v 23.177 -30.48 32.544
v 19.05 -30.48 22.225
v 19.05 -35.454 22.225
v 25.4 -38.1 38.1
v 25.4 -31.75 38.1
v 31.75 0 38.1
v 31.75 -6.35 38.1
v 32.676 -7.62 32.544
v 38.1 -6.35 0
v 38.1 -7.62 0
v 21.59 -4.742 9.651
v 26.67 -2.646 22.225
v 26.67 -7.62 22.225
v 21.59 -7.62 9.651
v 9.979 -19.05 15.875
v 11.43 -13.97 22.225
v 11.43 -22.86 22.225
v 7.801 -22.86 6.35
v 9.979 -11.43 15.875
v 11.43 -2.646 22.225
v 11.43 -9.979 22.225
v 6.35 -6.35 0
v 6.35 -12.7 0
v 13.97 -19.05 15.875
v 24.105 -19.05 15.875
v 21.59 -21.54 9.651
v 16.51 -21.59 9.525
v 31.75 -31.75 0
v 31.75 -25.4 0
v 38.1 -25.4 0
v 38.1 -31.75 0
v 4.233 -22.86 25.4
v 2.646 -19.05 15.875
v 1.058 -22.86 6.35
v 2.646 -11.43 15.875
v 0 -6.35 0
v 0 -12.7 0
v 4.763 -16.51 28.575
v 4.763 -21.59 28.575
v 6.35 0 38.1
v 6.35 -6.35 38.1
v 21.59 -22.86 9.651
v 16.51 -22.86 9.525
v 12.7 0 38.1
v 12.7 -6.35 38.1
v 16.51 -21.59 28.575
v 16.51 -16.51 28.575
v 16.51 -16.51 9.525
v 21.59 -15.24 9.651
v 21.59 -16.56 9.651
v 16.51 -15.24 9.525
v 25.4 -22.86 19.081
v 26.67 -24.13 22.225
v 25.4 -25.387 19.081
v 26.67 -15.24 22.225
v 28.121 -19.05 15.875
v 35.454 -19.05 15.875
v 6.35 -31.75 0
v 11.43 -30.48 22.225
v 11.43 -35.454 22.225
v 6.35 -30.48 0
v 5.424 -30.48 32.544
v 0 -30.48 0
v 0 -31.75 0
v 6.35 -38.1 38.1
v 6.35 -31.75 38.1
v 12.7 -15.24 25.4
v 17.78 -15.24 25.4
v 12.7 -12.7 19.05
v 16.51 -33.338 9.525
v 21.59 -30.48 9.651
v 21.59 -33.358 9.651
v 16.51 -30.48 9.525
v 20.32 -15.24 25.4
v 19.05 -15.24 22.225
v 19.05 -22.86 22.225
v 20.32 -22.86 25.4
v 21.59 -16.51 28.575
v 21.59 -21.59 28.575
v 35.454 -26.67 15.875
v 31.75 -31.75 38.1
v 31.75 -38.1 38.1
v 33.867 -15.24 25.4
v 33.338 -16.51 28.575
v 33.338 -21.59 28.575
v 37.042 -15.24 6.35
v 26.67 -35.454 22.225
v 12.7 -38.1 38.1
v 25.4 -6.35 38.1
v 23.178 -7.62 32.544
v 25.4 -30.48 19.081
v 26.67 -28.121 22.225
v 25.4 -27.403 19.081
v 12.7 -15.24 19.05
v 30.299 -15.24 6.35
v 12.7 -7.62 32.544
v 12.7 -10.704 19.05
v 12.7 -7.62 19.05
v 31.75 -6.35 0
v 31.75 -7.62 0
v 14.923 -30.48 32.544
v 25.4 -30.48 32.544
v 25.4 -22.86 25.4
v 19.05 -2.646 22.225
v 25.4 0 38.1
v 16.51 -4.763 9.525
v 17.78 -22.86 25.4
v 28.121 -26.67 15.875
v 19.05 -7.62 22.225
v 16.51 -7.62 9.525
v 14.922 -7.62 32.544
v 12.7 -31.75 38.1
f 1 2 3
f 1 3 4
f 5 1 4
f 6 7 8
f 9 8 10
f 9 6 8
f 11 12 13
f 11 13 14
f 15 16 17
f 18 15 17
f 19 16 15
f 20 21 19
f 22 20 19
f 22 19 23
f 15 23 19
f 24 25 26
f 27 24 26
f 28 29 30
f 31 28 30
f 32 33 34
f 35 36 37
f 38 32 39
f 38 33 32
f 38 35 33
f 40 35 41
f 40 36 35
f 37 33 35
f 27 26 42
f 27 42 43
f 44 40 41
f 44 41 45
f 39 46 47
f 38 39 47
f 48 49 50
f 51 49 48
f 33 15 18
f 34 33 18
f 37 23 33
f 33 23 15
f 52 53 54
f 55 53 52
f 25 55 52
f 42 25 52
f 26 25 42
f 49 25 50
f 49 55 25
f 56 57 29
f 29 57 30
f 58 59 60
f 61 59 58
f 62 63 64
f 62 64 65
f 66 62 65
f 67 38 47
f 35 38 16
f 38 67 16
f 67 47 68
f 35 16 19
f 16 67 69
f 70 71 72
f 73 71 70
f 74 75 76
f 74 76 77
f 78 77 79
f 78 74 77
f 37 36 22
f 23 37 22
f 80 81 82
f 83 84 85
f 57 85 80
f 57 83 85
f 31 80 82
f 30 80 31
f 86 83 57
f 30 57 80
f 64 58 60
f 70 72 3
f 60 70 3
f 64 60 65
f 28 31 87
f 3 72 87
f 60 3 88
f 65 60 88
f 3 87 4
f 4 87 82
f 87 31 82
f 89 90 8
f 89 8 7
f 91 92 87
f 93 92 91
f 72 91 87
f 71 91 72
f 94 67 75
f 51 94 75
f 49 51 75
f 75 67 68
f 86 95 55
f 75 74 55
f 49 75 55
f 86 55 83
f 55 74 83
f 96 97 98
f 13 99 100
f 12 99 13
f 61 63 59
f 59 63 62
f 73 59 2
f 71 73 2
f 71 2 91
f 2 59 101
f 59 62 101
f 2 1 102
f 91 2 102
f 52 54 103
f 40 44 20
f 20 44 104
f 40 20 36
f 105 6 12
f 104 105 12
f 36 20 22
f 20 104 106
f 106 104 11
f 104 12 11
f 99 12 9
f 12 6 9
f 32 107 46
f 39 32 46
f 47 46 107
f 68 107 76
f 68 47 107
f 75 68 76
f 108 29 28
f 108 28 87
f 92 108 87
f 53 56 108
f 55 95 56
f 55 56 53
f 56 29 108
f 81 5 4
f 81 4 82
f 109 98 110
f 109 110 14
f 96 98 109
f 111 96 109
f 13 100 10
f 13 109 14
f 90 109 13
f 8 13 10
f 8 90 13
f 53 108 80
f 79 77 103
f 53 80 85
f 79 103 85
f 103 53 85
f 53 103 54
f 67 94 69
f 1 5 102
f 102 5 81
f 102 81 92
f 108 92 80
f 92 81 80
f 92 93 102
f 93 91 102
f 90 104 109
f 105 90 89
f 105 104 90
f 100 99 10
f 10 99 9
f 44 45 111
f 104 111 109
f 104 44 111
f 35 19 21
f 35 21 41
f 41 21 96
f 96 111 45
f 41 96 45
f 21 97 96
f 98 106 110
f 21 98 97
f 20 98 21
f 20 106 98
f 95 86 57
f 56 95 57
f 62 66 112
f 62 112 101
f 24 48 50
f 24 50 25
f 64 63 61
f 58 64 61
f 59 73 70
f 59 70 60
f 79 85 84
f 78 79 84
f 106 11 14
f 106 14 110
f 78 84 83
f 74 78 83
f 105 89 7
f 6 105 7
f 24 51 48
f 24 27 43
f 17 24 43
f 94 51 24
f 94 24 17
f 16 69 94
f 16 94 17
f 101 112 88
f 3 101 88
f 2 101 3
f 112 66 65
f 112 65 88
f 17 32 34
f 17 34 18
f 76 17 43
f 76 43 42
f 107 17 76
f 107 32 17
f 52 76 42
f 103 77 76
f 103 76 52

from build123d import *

# Parameters (mm, degrees)
F0_W      = 38.1
F0_H      = 38.1
F1_DEPTH  = 38.1
F6_DEPTH  = 38.1
F8_DEPTH  = 38.1
F9_W      = 25.4
F9_H      = 7.62
F10_DEPTH = 38.1


with BuildPart() as f1:
    # F0 (on Front) → F1 (new body)
    with BuildSketch(Plane.XZ):
        with Locations((19.05, 19.05)):
            Rectangle(F0_W, F0_H)
    extrude(amount=F1_DEPTH)

    # F5 (on offset) → F6 (cut)
    with BuildSketch(Plane.YZ.offset(38.1)):
        Polygon((-11.43, 15.875), (-6.35, 38.1), (-31.75, 38.1), (-26.67, 15.875), (-21.59, 28.575), (-16.51, 28.575), align=None)
        Polygon((-31.75, 0), (-38.1, 38.1), (-38.1, 0), align=None)
        Polygon((-25.4, 0), (-12.7, 0), (-19.05, 15.875), align=None)
        Polygon((-6.35, 0), (0, 0), (0, 38.1), align=None)
    extrude(amount=-F6_DEPTH, mode=Mode.SUBTRACT)

    # F7 (on Front) → F8 (cut)
    with BuildSketch(Plane.XZ):
        Polygon((11.43, 22.225), (6.35, 0), (31.75, 0), (26.67, 22.225), (21.59, 9.650744), (16.51, 9.525), align=None)
        Polygon((31.75, 38.1), (38.1, 0), (38.1, 38.1), align=None)
        Polygon((25.4, 38.1), (12.7, 38.1), (19.05, 22.225), align=None)
        Polygon((0, 38.1), (0, 0), (6.35, 38.1), align=None)
    extrude(amount=F8_DEPTH, mode=Mode.SUBTRACT)

    # F9 (on offset) → F10 (cut)
    with BuildSketch(Plane.XY.offset(38.1)):
        with Locations((25.4, -11.43)):
            Rectangle(F9_W, F9_H)
        with Locations((12.7, -26.67)):
            Rectangle(F9_W, F9_H)
    extrude(amount=-F10_DEPTH, mode=Mode.SUBTRACT)


solid = f1.part
